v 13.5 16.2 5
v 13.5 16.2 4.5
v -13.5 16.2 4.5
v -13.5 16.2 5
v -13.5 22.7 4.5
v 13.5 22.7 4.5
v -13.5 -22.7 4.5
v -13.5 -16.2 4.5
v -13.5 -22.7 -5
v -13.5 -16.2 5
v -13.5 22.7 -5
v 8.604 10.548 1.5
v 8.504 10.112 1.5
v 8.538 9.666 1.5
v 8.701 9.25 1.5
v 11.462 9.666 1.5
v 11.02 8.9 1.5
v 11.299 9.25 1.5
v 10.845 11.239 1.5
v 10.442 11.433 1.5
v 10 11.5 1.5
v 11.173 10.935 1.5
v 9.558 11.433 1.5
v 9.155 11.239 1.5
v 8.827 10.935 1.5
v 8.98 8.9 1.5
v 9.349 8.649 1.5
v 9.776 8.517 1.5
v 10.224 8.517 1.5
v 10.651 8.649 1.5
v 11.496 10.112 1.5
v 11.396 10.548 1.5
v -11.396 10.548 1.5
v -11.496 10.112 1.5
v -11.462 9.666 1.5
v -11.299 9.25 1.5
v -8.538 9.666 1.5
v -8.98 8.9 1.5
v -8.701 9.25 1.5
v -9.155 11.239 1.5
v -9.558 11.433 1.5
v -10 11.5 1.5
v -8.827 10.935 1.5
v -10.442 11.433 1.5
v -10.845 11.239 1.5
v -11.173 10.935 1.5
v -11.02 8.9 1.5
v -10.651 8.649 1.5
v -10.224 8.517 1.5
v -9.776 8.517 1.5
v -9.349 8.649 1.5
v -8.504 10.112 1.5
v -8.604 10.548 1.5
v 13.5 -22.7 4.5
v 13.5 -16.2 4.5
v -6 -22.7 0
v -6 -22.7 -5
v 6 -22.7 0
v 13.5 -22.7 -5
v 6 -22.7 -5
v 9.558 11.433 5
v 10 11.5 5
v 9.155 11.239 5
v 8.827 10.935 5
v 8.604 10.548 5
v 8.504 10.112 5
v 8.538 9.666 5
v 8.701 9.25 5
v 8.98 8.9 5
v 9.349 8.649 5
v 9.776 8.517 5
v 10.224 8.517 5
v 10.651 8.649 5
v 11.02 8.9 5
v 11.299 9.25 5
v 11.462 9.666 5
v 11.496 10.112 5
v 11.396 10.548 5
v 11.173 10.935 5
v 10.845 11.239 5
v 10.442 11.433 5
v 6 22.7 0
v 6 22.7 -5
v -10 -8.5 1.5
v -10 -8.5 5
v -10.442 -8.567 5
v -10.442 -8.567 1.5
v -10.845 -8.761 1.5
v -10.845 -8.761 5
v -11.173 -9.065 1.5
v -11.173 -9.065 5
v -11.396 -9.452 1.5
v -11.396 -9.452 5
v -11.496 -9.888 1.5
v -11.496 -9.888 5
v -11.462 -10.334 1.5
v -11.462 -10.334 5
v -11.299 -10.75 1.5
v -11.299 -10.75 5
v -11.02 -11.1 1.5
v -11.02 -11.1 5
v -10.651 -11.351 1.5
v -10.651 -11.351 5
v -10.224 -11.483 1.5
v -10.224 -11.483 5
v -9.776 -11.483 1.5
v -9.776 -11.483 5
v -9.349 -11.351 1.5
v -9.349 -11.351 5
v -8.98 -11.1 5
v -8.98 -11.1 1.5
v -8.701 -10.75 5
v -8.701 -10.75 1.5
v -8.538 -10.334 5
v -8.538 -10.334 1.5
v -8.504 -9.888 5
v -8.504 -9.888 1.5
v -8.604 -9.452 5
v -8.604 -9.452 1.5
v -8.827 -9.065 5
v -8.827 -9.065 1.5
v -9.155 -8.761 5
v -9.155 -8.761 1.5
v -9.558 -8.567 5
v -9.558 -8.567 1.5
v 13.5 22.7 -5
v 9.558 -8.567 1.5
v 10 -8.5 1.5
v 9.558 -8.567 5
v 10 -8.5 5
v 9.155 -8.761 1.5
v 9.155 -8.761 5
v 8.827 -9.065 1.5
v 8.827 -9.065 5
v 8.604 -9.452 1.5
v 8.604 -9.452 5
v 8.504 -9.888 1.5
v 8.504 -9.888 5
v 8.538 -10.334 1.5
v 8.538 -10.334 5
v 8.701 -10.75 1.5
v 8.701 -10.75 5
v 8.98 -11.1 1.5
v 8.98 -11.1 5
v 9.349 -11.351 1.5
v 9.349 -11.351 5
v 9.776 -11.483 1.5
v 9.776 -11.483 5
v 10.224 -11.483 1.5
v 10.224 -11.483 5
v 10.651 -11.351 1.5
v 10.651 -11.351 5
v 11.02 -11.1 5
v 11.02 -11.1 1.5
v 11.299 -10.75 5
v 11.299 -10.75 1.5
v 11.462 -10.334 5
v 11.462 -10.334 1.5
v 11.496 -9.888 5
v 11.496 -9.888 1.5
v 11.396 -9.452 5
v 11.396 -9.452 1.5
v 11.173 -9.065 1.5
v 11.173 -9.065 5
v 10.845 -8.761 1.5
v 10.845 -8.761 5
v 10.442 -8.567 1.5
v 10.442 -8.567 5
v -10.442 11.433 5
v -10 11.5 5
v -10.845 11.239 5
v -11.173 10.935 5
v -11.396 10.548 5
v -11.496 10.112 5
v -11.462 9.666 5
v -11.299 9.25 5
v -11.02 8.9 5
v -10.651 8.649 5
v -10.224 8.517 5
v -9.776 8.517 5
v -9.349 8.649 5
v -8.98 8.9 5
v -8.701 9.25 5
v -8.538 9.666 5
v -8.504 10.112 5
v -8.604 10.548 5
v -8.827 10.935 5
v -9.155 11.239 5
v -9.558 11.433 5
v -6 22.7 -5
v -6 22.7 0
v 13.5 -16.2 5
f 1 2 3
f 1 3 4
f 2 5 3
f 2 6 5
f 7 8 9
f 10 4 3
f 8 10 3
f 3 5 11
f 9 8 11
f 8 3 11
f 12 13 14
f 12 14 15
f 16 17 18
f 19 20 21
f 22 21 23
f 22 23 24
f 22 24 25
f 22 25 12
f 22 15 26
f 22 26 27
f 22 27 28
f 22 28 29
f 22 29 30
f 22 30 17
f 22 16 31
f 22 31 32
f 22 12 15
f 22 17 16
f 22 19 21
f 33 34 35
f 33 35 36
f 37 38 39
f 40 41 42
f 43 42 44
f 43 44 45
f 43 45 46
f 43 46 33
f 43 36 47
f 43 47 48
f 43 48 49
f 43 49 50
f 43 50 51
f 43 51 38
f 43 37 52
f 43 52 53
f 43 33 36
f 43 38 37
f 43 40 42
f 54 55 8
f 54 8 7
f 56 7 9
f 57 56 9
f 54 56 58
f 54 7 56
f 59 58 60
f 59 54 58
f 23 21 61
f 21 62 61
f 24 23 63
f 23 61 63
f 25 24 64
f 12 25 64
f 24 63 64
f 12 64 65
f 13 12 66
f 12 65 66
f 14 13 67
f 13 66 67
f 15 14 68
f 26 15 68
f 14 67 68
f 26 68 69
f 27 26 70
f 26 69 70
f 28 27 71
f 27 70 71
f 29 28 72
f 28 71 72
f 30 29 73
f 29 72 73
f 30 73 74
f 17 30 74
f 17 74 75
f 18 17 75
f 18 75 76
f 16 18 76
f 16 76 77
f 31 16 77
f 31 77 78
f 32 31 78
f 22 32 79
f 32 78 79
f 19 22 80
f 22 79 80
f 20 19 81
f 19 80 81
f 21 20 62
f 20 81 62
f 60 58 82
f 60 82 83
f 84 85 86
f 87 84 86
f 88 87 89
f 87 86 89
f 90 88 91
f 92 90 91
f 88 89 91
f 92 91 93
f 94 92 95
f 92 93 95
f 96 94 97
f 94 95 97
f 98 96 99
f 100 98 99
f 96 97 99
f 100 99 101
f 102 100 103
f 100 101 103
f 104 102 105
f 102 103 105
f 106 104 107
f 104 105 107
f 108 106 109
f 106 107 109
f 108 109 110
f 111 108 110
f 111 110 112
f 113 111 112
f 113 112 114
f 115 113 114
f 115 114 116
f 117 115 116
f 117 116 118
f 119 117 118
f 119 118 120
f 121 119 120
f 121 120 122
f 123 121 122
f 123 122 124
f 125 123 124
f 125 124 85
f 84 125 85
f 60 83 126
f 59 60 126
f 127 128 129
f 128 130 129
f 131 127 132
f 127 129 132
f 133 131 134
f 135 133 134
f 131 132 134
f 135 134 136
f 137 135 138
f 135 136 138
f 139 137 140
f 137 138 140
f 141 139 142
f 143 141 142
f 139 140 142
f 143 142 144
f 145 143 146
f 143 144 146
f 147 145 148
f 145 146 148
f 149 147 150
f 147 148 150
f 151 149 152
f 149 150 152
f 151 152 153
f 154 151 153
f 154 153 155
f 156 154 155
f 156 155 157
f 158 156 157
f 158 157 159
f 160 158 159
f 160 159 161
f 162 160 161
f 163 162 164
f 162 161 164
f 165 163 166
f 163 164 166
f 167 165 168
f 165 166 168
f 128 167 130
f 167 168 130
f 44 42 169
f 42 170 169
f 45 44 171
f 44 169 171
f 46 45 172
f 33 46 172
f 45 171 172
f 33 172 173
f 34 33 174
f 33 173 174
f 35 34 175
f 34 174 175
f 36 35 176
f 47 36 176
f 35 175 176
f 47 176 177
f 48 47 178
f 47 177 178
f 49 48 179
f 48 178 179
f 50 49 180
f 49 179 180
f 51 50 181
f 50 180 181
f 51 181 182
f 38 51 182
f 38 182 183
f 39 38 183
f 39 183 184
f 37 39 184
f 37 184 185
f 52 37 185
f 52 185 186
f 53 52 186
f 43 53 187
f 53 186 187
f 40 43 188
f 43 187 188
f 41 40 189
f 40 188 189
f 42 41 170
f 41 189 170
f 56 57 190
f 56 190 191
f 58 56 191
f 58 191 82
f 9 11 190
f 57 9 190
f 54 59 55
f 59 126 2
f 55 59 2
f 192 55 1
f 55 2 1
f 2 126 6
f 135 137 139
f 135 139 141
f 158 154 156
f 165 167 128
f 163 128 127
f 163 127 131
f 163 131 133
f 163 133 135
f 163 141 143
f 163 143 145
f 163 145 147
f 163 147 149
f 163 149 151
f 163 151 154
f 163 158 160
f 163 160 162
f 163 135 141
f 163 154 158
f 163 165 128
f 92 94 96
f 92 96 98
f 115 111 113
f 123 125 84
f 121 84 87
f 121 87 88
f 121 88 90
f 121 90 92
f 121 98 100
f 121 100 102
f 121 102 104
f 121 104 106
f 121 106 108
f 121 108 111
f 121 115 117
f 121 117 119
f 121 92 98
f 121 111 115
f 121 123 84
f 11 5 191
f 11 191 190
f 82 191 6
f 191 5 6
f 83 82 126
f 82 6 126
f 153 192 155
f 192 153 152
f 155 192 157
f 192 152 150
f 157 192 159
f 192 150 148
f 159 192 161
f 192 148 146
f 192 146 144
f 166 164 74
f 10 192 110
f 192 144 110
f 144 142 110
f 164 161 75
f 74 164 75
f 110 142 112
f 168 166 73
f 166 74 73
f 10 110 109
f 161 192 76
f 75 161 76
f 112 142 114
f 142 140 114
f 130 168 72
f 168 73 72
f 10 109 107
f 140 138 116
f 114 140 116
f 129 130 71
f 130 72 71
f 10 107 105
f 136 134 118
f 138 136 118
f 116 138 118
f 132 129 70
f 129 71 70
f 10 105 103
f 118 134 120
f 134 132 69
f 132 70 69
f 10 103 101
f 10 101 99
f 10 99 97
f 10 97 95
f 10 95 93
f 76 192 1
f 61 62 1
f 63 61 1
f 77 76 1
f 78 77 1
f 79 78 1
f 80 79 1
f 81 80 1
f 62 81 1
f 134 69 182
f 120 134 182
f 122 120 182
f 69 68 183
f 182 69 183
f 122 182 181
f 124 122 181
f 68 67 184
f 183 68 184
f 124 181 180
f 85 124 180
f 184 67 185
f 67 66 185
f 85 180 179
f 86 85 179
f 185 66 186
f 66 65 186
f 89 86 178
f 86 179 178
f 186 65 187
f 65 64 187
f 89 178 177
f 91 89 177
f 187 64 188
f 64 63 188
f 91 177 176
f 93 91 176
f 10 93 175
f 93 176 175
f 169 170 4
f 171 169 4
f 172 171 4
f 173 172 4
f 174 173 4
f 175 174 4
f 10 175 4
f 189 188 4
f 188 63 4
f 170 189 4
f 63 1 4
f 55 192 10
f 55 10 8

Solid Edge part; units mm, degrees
sketch "Sketch1" plane through (0, 0, 0) normal (0, -1, 0) x (1, 0, 0)
  line L0 (-13.5, -5) -> (13.5, -5)
  line L1 (13.5, -5) -> (13.5, 5)
  line L2 (13.5, 5) -> (-13.5, 5)
  line L3 (-13.5, 5) -> (-13.5, -5)
  dimension "D1" = 27
  dimension "D2" = 10
extrude "Protrusion1" add sketch "Sketch1" along normal mid plane 45.4
sketch "Sketch2" plane through (13.5, 0, 0) normal (1, 0, 0) x (0, 1, 0)
  line L0 (-22.7, 5) -> (-16.2, 5)
  line L1 (-16.2, 5) -> (-16.2, 4.5)
  line L2 (-16.2, 4.5) -> (-22.7, 4.5)
  line L3 (-22.7, 4.5) -> (-22.7, 5)
  dimension "D1" = 16.2
  dimension "D2" = 0.5
extrude "Cutout1" cut sketch "Sketch2" against normal through all
mirror "Mirror1" about plane through (0, 0, 0) normal (0, -1, 0) of "Cutout1"
sketch "Sketch3" plane through (0, -22.7, -0.25) normal (0, -1, 0) x (1, 0, 0)
  line L0 (0, -4.75) -> (-6, -4.75)
  line L1 (-6, -4.75) -> (-6, 0.25)
  line L2 (-6, 0.25) -> (0, 0.25)
  line L3 (0, 0.25) -> (0, -4.75)
  dimension "D1" = 5
  dimension "D2" = 6
extrude "Cutout3" cut sketch "Sketch3" against normal through all
mirror "Mirror2" about plane through (0, 0, 0) normal (-1, 0, 0) of "Cutout3"
sketch "Sketch4" plane through (0, 0, 5) normal (0, 0, 1) x (0, 1, 0)
  circle A0 centre (-10, 10) radius 1.5
  circle A1 centre (10, 10) radius 1.5
  circle A2 centre (10, -10) radius 1.5
  circle A3 centre (-10, -10) radius 1.5
  dimension "D1" = 3
  dimension "D2" = 20
  dimension "D3" = 20
extrude "ExtrudedCutout_5" cut sketch "Sketch4" against normal blind 3.5
properties material "Stainless Steel, 304"
